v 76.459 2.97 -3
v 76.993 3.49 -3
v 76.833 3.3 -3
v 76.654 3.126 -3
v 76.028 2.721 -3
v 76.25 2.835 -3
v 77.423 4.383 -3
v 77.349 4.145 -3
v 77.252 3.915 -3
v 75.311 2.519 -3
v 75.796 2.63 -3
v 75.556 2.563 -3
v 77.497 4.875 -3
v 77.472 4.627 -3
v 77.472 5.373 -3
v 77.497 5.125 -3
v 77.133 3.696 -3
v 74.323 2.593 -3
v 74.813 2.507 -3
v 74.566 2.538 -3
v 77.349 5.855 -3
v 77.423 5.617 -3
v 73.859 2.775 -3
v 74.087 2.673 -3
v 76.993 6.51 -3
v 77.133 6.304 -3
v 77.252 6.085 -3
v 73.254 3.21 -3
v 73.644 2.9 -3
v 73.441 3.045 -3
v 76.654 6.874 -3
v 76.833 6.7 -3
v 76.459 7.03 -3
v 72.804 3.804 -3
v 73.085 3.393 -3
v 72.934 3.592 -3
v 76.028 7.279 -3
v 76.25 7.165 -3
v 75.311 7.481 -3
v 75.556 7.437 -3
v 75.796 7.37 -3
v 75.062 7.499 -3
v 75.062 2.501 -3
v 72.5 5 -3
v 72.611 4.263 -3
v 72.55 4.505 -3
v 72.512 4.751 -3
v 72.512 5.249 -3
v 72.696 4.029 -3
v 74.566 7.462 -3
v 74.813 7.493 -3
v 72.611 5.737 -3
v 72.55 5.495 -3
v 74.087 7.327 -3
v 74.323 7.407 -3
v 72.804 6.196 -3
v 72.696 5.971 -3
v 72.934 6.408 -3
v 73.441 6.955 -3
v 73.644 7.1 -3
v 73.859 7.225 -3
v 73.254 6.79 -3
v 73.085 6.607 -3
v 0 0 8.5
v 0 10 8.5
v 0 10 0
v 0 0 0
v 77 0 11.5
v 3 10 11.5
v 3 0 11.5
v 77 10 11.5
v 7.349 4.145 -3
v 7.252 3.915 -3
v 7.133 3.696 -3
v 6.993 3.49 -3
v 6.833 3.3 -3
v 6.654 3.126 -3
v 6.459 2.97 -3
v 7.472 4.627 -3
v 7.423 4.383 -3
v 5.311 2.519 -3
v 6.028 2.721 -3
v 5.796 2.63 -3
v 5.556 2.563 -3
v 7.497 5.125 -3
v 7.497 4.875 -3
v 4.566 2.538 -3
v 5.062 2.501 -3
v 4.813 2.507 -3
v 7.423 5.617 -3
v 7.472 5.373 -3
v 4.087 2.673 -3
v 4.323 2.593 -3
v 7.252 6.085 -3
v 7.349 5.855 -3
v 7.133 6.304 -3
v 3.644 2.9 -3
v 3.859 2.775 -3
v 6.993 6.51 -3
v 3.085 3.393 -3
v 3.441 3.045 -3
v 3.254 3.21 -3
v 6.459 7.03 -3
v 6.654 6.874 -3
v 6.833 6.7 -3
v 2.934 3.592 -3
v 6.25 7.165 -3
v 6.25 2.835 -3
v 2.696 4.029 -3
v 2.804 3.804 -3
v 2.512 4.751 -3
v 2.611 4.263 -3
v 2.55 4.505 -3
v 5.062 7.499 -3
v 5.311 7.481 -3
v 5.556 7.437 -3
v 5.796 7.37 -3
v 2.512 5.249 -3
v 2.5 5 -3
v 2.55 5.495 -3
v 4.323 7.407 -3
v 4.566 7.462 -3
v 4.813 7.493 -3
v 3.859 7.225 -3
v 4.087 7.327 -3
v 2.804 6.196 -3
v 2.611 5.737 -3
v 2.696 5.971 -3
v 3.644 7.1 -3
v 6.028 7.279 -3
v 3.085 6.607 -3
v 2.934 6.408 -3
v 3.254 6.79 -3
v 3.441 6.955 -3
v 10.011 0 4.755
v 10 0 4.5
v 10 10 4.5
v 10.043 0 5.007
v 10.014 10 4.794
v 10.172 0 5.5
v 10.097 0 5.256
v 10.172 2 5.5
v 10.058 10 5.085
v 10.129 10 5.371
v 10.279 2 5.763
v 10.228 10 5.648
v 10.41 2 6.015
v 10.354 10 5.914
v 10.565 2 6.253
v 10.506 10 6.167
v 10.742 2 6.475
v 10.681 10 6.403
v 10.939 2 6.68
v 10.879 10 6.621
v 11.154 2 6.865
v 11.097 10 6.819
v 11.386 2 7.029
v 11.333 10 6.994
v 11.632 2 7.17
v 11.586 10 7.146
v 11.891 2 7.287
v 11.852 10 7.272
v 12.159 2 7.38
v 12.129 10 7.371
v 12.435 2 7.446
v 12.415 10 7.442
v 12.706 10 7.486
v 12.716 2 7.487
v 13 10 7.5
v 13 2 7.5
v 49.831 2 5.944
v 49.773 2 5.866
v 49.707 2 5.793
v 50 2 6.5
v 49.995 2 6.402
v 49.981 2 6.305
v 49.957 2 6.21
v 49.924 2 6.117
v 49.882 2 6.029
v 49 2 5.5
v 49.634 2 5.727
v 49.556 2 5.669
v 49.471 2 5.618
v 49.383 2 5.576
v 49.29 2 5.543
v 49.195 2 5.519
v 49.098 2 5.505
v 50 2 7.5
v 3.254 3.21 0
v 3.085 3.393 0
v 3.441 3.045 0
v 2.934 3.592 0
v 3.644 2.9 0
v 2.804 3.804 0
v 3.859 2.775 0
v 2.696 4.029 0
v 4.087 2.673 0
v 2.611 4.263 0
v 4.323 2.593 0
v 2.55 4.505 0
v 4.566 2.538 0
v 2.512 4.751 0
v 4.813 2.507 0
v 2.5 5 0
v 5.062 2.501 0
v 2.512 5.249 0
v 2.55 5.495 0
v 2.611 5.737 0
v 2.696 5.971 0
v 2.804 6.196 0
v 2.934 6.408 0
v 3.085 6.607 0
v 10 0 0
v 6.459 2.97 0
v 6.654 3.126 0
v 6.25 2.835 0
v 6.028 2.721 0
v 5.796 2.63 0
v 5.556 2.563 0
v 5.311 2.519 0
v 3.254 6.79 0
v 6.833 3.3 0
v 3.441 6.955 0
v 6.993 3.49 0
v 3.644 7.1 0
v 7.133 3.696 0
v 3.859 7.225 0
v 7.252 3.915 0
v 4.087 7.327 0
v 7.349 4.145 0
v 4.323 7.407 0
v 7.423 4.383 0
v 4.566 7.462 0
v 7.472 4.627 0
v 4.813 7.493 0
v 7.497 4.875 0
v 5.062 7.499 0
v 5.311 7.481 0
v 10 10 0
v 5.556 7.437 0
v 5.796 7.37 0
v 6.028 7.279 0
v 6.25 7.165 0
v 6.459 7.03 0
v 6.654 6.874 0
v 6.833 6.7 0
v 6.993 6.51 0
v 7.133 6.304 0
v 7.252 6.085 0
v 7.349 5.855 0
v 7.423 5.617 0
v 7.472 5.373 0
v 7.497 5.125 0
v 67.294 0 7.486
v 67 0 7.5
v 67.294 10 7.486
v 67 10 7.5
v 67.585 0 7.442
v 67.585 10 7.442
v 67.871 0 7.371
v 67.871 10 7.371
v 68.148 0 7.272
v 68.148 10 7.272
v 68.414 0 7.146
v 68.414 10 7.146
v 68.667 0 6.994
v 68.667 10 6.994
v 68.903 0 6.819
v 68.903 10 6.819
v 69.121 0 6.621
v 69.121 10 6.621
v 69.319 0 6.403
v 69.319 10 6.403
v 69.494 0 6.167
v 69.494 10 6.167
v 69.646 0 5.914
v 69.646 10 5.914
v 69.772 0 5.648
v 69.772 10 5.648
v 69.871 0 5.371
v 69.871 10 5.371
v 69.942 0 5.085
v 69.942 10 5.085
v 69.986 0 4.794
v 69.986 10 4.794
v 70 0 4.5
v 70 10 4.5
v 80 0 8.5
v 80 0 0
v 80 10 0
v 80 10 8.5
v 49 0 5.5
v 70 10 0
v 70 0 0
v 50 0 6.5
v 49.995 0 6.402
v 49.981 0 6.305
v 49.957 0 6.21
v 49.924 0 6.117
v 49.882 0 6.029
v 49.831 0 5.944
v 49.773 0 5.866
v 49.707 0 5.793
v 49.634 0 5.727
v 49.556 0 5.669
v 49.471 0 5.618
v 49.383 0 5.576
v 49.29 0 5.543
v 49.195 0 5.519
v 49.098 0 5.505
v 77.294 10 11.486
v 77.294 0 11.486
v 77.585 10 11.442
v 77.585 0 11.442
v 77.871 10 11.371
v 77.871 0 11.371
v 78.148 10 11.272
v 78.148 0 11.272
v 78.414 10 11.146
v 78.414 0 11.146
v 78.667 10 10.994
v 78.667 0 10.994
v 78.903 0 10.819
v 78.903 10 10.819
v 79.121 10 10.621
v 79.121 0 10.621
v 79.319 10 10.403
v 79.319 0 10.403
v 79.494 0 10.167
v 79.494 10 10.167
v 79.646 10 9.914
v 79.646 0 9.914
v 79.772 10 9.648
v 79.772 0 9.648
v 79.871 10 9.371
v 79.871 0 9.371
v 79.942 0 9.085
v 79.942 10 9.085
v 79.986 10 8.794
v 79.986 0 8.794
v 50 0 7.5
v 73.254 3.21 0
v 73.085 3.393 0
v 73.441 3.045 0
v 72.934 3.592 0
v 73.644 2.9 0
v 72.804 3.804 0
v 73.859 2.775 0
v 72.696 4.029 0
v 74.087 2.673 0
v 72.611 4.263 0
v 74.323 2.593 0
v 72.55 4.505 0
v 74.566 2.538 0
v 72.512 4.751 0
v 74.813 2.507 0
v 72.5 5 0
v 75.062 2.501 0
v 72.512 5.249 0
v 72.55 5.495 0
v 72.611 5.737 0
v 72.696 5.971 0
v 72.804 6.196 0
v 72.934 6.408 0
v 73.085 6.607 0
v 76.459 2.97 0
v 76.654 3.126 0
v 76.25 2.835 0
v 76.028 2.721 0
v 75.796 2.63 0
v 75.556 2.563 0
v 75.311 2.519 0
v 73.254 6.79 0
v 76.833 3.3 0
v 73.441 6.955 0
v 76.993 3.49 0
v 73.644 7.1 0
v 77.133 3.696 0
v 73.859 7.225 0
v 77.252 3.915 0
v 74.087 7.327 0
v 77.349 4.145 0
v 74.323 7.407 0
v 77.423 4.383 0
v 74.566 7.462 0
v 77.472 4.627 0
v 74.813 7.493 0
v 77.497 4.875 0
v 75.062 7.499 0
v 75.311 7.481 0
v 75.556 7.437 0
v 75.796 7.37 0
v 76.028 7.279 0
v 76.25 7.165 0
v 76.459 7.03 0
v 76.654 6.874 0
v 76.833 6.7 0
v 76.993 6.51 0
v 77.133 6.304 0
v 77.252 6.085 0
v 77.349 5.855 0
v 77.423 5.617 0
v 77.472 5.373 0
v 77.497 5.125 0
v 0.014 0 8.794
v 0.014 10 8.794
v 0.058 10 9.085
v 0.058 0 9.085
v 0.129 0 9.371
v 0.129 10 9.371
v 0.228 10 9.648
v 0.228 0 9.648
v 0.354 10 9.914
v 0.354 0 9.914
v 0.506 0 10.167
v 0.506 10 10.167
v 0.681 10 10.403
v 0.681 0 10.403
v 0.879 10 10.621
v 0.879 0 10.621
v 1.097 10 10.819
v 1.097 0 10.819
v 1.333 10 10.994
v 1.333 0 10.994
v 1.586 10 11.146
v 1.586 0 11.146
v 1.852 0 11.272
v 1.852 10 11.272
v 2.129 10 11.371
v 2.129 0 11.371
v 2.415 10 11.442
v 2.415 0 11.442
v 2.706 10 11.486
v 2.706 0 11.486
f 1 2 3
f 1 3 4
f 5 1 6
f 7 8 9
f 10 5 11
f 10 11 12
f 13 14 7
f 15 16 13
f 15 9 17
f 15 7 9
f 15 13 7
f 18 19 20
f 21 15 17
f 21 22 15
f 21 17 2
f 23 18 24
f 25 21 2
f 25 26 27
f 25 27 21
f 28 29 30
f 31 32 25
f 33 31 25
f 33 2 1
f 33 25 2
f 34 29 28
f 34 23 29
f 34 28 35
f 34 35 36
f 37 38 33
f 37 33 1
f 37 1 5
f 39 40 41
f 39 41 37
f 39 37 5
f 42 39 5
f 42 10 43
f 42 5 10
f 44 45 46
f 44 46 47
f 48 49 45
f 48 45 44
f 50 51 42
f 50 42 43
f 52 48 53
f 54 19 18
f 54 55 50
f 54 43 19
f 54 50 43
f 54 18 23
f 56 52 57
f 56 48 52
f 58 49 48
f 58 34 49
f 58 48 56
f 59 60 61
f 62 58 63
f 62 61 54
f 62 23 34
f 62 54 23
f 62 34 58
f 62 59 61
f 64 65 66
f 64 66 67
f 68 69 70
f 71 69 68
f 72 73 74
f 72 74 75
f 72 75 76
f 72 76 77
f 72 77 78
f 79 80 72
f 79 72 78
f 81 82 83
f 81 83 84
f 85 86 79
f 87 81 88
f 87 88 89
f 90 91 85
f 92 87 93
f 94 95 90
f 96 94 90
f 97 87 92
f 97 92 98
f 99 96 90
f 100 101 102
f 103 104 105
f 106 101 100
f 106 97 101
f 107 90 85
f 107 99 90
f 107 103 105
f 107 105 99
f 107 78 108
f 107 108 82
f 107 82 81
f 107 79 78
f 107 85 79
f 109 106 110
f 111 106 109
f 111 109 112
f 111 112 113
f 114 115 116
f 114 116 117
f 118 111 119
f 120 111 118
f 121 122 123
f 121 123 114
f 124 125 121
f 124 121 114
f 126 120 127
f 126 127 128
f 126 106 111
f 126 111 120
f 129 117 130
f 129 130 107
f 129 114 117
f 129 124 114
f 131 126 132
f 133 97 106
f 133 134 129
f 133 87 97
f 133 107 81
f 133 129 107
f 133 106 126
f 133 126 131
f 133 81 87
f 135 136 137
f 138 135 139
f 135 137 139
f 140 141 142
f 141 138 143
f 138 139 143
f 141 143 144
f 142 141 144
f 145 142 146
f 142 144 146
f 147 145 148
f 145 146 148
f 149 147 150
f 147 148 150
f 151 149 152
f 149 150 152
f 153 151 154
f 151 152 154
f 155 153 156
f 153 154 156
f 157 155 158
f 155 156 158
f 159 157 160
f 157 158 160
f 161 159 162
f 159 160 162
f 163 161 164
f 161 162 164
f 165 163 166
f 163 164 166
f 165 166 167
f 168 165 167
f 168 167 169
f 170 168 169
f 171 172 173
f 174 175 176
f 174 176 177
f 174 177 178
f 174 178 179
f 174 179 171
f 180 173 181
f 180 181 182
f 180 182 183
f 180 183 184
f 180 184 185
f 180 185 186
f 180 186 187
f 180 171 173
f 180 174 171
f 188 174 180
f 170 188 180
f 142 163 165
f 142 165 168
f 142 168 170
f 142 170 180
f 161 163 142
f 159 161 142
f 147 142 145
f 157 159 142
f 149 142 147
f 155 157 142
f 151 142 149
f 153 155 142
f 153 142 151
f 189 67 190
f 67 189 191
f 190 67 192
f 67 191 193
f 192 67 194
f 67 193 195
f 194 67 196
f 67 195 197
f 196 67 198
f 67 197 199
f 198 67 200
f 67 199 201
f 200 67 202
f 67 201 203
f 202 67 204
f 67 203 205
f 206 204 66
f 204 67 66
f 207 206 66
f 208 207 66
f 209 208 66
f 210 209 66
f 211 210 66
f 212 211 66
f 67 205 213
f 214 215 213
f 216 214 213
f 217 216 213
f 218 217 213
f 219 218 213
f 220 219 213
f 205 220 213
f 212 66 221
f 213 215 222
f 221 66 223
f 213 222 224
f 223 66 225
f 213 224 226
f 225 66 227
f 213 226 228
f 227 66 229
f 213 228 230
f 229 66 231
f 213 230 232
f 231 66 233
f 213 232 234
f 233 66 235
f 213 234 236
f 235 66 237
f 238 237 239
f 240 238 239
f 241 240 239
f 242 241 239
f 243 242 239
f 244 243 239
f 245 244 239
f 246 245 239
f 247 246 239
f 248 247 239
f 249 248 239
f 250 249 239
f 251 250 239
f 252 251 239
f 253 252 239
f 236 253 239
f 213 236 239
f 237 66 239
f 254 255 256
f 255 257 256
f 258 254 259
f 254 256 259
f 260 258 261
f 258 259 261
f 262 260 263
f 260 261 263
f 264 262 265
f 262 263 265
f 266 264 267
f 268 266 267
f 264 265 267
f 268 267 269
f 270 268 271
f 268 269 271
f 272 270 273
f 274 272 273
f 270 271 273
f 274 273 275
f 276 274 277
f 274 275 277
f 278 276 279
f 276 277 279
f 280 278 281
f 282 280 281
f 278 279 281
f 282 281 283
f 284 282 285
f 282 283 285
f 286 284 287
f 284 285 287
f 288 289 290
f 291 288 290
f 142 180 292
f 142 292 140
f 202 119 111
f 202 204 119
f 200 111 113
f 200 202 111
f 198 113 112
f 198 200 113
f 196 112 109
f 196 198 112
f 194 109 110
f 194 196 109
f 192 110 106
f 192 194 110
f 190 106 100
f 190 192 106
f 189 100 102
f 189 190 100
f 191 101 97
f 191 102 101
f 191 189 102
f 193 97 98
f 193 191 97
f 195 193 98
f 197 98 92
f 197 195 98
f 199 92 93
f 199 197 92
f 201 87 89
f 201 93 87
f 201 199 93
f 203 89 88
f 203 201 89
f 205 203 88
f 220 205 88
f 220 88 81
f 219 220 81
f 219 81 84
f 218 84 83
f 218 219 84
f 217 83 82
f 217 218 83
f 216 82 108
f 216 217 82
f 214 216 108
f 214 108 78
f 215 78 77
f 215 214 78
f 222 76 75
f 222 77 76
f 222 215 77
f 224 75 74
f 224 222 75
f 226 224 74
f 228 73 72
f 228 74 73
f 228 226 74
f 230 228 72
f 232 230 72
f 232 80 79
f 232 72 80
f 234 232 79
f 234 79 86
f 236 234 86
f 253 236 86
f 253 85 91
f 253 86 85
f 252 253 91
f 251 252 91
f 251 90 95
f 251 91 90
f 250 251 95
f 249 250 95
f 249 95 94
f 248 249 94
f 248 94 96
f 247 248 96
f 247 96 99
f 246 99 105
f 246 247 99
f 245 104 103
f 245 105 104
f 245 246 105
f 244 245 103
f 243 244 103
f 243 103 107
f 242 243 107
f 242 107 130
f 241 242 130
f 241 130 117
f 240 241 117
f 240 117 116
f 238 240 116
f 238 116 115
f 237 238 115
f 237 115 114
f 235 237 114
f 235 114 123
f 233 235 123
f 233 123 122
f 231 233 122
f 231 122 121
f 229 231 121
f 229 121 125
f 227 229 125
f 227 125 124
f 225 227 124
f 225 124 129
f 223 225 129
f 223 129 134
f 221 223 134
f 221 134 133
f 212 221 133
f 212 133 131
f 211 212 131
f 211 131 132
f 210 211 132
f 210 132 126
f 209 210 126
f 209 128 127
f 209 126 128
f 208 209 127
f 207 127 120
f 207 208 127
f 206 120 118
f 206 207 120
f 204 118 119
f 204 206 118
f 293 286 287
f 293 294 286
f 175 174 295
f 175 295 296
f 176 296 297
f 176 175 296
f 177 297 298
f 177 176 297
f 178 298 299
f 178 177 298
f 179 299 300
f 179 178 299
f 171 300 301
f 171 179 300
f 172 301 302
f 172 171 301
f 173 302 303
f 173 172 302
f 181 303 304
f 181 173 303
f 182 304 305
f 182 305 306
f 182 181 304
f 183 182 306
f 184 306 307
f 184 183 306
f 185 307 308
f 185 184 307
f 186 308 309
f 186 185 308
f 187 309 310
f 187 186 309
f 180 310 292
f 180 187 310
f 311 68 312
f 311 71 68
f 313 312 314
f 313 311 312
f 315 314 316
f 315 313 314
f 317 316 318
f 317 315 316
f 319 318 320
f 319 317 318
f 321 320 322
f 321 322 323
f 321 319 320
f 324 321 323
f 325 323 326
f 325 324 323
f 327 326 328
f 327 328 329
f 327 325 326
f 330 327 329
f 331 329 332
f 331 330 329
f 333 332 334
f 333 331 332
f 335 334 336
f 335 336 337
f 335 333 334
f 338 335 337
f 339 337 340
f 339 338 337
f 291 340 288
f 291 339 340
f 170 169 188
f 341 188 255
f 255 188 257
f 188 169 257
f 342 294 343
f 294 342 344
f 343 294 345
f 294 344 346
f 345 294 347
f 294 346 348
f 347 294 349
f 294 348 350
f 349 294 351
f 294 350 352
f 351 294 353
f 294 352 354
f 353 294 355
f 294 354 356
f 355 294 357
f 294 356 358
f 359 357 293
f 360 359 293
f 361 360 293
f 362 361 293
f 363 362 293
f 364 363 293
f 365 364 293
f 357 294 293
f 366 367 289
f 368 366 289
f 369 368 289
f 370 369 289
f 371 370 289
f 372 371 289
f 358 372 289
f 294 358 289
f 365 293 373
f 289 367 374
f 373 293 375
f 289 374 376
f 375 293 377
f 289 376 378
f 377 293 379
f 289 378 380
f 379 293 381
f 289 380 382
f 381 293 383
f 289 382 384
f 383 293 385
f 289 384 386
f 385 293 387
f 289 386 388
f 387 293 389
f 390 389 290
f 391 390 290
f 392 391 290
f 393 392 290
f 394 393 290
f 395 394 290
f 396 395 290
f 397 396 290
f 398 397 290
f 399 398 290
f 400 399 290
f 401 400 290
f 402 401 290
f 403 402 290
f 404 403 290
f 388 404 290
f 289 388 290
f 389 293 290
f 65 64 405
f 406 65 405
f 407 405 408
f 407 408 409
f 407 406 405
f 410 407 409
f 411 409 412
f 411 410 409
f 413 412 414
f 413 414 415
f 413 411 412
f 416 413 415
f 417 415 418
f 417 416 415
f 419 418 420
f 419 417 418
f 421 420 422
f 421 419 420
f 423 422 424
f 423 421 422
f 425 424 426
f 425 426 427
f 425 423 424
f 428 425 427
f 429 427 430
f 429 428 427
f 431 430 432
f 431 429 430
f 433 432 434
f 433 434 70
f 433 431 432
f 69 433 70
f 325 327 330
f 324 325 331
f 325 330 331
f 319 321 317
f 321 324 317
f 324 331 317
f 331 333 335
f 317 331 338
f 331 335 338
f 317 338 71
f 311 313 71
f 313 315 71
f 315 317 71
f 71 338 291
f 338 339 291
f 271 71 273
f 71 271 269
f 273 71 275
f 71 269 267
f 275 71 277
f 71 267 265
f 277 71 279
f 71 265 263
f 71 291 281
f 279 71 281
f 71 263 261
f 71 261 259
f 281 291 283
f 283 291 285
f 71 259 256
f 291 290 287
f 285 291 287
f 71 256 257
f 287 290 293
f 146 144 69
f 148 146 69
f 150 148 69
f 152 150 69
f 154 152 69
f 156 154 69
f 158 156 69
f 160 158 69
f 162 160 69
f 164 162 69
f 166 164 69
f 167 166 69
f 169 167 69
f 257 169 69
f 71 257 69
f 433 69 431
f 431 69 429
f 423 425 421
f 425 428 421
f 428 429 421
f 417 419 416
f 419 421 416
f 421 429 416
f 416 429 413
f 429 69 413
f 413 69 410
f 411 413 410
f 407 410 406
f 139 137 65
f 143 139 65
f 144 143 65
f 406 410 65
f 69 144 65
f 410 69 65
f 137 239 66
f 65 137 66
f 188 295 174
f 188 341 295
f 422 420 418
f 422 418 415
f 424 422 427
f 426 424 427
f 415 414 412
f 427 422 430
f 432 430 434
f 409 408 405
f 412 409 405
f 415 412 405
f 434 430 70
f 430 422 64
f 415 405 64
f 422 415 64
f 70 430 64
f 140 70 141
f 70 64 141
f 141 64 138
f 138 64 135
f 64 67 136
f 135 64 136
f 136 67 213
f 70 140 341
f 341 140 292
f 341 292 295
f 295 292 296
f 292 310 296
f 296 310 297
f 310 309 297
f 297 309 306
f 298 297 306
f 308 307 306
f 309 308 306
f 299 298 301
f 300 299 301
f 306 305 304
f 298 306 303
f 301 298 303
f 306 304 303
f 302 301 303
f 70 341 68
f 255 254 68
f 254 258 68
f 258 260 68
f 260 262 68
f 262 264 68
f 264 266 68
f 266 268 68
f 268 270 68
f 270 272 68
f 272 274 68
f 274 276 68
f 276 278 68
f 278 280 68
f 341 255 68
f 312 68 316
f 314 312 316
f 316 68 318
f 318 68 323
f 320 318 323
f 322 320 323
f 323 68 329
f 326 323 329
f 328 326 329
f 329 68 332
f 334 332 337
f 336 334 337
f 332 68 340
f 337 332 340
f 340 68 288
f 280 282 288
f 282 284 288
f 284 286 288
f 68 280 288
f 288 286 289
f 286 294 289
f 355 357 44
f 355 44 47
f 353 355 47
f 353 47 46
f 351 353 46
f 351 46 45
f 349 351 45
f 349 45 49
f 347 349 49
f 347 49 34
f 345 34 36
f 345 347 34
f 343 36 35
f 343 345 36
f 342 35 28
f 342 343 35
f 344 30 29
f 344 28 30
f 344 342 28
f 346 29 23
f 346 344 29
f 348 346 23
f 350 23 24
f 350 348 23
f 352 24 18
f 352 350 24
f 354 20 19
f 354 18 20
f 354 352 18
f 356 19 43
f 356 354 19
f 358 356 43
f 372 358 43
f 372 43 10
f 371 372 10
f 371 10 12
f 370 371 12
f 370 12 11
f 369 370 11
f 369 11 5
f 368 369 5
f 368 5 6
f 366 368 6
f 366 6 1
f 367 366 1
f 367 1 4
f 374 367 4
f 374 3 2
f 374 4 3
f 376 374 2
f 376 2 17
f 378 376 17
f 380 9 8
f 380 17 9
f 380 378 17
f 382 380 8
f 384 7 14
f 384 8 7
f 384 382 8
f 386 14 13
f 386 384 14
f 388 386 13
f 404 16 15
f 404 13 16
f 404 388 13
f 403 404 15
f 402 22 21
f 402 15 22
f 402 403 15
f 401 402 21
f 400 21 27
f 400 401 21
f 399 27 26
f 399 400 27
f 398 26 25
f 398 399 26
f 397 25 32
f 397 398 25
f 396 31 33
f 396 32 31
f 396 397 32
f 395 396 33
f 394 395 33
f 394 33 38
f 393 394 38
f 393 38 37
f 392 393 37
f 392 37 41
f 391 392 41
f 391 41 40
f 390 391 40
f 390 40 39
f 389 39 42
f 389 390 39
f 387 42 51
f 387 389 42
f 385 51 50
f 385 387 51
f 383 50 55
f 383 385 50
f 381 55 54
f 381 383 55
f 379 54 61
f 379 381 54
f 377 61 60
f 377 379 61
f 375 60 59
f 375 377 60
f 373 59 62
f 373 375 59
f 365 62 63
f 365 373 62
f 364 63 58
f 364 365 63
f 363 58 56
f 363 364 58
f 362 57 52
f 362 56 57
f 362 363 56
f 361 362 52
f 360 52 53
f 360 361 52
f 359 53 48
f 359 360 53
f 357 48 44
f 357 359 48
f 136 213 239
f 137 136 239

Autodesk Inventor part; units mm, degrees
ref_plane "YZ Plane" through (0, 0, 0) normal (1, 0, 0) x (0, 1, 0)
ref_plane "XZ Plane" through (0, 0, 0) normal (0, 1, 0) x (-1, 0, 0)
ref_plane "XY Plane" through (0, 0, 0) normal (0, 0, 1) x (1, 0, 0)
sketch "Skizze1" plane through (0, 0, 0) normal (0, 0, 1) x (1, 0, 0)
  line L0 (0, 0) -> (10, 0)
  line L1 (10, 0) -> (10, 10)
  line L2 (10, 10) -> (0, 10)
  line L3 (0, 10) -> (0, 0)
  line L4 (70, 10) -> (80, 10)
  line L5 (80, 10) -> (80, 0)
  line L6 (80, 0) -> (70, 0)
  line L7 (70, 0) -> (70, 10)
  dimension "d0" = 10
  dimension "d1" = 10
  dimension "d2" = 10
  dimension "d3" = 10
  dimension "d4" = 60
extrude "Extrusion1" add sketch "Skizze1" along normal blind 7.5
sketch "Skizze2" plane through (0, 0, 7.5) normal (0, 0, 1) x (1, 0, 0)
  line L0 (80, 10) -> (70, 10) projected
  line L1 (70, 10) -> (70, 0) projected
  line L2 (70, 0) -> (80, 0) projected
  line L3 (80, 0) -> (80, 10) projected
  line L4 (0, 10) -> (80, 10)
  line L5 (80, 10) -> (80, 0)
  line L6 (80, 0) -> (0, 0)
  line L7 (0, 0) -> (0, 10)
extrude "Extrusion2" add sketch "Skizze2" along normal blind 4
fillet "Rundung1" radius 3 1 edges at (0, 5, 11.5)
fillet "Rundung1" radius 3 1 edges at (80, 5, 11.5)
fillet "Rundung1" radius 3 1 edges at (70, 5, 7.5)
fillet "Rundung1" radius 3 1 edges at (10, 5, 7.5)
sketch "Skizze3" plane through (0, 0, 7.5) normal (0, 0, -1) x (-1, 0, 0)
  line L0 (0, 0) -> (-50, 0)
  line L1 (-50, 0) -> (-50, 2)
  line L2 (-50, 2) -> (0, 2)
  line L3 (0, 2) -> (0, 0)
  dimension "d13" = 50
  dimension "d14" = 2
extrude "Extrusion3" add sketch "Skizze3" along normal blind 2
fillet "Rundung2" radius 1 1 edges at (50, 1, 5.5)
sketch "Skizze4" plane through (0, 0, 0) normal (0, 0, -1) x (-1, 0, 0)
  line L0 (0, 0) -> (-10, 0) projected
  line L1 (0, 10) -> (0, 0) projected
  circle A0 centre (-5, 5) radius 2.5
  dimension "d18" = 5
  dimension "d19" = 5
  dimension "d20" = 5
sketch "Skizze5" plane through (0, 0, 0) normal (0, 0, -1) x (-1, 0, 0)
  line L0 (-80, 0) -> (-70, 0) projected
  line L1 (-70, 0) -> (-70, 10) projected
  circle A0 centre (-75, 5) radius 2.5
  point P0 (0, 0)
  dimension "d21" = 5
  dimension "d22" = 5
  dimension "d23" = 5
extrude "Extrusion4" add sketch "Skizze4" along normal blind 3
extrude "Extrusion5" add sketch "Skizze5" along normal blind 3
properties part number "USB-Halter"
